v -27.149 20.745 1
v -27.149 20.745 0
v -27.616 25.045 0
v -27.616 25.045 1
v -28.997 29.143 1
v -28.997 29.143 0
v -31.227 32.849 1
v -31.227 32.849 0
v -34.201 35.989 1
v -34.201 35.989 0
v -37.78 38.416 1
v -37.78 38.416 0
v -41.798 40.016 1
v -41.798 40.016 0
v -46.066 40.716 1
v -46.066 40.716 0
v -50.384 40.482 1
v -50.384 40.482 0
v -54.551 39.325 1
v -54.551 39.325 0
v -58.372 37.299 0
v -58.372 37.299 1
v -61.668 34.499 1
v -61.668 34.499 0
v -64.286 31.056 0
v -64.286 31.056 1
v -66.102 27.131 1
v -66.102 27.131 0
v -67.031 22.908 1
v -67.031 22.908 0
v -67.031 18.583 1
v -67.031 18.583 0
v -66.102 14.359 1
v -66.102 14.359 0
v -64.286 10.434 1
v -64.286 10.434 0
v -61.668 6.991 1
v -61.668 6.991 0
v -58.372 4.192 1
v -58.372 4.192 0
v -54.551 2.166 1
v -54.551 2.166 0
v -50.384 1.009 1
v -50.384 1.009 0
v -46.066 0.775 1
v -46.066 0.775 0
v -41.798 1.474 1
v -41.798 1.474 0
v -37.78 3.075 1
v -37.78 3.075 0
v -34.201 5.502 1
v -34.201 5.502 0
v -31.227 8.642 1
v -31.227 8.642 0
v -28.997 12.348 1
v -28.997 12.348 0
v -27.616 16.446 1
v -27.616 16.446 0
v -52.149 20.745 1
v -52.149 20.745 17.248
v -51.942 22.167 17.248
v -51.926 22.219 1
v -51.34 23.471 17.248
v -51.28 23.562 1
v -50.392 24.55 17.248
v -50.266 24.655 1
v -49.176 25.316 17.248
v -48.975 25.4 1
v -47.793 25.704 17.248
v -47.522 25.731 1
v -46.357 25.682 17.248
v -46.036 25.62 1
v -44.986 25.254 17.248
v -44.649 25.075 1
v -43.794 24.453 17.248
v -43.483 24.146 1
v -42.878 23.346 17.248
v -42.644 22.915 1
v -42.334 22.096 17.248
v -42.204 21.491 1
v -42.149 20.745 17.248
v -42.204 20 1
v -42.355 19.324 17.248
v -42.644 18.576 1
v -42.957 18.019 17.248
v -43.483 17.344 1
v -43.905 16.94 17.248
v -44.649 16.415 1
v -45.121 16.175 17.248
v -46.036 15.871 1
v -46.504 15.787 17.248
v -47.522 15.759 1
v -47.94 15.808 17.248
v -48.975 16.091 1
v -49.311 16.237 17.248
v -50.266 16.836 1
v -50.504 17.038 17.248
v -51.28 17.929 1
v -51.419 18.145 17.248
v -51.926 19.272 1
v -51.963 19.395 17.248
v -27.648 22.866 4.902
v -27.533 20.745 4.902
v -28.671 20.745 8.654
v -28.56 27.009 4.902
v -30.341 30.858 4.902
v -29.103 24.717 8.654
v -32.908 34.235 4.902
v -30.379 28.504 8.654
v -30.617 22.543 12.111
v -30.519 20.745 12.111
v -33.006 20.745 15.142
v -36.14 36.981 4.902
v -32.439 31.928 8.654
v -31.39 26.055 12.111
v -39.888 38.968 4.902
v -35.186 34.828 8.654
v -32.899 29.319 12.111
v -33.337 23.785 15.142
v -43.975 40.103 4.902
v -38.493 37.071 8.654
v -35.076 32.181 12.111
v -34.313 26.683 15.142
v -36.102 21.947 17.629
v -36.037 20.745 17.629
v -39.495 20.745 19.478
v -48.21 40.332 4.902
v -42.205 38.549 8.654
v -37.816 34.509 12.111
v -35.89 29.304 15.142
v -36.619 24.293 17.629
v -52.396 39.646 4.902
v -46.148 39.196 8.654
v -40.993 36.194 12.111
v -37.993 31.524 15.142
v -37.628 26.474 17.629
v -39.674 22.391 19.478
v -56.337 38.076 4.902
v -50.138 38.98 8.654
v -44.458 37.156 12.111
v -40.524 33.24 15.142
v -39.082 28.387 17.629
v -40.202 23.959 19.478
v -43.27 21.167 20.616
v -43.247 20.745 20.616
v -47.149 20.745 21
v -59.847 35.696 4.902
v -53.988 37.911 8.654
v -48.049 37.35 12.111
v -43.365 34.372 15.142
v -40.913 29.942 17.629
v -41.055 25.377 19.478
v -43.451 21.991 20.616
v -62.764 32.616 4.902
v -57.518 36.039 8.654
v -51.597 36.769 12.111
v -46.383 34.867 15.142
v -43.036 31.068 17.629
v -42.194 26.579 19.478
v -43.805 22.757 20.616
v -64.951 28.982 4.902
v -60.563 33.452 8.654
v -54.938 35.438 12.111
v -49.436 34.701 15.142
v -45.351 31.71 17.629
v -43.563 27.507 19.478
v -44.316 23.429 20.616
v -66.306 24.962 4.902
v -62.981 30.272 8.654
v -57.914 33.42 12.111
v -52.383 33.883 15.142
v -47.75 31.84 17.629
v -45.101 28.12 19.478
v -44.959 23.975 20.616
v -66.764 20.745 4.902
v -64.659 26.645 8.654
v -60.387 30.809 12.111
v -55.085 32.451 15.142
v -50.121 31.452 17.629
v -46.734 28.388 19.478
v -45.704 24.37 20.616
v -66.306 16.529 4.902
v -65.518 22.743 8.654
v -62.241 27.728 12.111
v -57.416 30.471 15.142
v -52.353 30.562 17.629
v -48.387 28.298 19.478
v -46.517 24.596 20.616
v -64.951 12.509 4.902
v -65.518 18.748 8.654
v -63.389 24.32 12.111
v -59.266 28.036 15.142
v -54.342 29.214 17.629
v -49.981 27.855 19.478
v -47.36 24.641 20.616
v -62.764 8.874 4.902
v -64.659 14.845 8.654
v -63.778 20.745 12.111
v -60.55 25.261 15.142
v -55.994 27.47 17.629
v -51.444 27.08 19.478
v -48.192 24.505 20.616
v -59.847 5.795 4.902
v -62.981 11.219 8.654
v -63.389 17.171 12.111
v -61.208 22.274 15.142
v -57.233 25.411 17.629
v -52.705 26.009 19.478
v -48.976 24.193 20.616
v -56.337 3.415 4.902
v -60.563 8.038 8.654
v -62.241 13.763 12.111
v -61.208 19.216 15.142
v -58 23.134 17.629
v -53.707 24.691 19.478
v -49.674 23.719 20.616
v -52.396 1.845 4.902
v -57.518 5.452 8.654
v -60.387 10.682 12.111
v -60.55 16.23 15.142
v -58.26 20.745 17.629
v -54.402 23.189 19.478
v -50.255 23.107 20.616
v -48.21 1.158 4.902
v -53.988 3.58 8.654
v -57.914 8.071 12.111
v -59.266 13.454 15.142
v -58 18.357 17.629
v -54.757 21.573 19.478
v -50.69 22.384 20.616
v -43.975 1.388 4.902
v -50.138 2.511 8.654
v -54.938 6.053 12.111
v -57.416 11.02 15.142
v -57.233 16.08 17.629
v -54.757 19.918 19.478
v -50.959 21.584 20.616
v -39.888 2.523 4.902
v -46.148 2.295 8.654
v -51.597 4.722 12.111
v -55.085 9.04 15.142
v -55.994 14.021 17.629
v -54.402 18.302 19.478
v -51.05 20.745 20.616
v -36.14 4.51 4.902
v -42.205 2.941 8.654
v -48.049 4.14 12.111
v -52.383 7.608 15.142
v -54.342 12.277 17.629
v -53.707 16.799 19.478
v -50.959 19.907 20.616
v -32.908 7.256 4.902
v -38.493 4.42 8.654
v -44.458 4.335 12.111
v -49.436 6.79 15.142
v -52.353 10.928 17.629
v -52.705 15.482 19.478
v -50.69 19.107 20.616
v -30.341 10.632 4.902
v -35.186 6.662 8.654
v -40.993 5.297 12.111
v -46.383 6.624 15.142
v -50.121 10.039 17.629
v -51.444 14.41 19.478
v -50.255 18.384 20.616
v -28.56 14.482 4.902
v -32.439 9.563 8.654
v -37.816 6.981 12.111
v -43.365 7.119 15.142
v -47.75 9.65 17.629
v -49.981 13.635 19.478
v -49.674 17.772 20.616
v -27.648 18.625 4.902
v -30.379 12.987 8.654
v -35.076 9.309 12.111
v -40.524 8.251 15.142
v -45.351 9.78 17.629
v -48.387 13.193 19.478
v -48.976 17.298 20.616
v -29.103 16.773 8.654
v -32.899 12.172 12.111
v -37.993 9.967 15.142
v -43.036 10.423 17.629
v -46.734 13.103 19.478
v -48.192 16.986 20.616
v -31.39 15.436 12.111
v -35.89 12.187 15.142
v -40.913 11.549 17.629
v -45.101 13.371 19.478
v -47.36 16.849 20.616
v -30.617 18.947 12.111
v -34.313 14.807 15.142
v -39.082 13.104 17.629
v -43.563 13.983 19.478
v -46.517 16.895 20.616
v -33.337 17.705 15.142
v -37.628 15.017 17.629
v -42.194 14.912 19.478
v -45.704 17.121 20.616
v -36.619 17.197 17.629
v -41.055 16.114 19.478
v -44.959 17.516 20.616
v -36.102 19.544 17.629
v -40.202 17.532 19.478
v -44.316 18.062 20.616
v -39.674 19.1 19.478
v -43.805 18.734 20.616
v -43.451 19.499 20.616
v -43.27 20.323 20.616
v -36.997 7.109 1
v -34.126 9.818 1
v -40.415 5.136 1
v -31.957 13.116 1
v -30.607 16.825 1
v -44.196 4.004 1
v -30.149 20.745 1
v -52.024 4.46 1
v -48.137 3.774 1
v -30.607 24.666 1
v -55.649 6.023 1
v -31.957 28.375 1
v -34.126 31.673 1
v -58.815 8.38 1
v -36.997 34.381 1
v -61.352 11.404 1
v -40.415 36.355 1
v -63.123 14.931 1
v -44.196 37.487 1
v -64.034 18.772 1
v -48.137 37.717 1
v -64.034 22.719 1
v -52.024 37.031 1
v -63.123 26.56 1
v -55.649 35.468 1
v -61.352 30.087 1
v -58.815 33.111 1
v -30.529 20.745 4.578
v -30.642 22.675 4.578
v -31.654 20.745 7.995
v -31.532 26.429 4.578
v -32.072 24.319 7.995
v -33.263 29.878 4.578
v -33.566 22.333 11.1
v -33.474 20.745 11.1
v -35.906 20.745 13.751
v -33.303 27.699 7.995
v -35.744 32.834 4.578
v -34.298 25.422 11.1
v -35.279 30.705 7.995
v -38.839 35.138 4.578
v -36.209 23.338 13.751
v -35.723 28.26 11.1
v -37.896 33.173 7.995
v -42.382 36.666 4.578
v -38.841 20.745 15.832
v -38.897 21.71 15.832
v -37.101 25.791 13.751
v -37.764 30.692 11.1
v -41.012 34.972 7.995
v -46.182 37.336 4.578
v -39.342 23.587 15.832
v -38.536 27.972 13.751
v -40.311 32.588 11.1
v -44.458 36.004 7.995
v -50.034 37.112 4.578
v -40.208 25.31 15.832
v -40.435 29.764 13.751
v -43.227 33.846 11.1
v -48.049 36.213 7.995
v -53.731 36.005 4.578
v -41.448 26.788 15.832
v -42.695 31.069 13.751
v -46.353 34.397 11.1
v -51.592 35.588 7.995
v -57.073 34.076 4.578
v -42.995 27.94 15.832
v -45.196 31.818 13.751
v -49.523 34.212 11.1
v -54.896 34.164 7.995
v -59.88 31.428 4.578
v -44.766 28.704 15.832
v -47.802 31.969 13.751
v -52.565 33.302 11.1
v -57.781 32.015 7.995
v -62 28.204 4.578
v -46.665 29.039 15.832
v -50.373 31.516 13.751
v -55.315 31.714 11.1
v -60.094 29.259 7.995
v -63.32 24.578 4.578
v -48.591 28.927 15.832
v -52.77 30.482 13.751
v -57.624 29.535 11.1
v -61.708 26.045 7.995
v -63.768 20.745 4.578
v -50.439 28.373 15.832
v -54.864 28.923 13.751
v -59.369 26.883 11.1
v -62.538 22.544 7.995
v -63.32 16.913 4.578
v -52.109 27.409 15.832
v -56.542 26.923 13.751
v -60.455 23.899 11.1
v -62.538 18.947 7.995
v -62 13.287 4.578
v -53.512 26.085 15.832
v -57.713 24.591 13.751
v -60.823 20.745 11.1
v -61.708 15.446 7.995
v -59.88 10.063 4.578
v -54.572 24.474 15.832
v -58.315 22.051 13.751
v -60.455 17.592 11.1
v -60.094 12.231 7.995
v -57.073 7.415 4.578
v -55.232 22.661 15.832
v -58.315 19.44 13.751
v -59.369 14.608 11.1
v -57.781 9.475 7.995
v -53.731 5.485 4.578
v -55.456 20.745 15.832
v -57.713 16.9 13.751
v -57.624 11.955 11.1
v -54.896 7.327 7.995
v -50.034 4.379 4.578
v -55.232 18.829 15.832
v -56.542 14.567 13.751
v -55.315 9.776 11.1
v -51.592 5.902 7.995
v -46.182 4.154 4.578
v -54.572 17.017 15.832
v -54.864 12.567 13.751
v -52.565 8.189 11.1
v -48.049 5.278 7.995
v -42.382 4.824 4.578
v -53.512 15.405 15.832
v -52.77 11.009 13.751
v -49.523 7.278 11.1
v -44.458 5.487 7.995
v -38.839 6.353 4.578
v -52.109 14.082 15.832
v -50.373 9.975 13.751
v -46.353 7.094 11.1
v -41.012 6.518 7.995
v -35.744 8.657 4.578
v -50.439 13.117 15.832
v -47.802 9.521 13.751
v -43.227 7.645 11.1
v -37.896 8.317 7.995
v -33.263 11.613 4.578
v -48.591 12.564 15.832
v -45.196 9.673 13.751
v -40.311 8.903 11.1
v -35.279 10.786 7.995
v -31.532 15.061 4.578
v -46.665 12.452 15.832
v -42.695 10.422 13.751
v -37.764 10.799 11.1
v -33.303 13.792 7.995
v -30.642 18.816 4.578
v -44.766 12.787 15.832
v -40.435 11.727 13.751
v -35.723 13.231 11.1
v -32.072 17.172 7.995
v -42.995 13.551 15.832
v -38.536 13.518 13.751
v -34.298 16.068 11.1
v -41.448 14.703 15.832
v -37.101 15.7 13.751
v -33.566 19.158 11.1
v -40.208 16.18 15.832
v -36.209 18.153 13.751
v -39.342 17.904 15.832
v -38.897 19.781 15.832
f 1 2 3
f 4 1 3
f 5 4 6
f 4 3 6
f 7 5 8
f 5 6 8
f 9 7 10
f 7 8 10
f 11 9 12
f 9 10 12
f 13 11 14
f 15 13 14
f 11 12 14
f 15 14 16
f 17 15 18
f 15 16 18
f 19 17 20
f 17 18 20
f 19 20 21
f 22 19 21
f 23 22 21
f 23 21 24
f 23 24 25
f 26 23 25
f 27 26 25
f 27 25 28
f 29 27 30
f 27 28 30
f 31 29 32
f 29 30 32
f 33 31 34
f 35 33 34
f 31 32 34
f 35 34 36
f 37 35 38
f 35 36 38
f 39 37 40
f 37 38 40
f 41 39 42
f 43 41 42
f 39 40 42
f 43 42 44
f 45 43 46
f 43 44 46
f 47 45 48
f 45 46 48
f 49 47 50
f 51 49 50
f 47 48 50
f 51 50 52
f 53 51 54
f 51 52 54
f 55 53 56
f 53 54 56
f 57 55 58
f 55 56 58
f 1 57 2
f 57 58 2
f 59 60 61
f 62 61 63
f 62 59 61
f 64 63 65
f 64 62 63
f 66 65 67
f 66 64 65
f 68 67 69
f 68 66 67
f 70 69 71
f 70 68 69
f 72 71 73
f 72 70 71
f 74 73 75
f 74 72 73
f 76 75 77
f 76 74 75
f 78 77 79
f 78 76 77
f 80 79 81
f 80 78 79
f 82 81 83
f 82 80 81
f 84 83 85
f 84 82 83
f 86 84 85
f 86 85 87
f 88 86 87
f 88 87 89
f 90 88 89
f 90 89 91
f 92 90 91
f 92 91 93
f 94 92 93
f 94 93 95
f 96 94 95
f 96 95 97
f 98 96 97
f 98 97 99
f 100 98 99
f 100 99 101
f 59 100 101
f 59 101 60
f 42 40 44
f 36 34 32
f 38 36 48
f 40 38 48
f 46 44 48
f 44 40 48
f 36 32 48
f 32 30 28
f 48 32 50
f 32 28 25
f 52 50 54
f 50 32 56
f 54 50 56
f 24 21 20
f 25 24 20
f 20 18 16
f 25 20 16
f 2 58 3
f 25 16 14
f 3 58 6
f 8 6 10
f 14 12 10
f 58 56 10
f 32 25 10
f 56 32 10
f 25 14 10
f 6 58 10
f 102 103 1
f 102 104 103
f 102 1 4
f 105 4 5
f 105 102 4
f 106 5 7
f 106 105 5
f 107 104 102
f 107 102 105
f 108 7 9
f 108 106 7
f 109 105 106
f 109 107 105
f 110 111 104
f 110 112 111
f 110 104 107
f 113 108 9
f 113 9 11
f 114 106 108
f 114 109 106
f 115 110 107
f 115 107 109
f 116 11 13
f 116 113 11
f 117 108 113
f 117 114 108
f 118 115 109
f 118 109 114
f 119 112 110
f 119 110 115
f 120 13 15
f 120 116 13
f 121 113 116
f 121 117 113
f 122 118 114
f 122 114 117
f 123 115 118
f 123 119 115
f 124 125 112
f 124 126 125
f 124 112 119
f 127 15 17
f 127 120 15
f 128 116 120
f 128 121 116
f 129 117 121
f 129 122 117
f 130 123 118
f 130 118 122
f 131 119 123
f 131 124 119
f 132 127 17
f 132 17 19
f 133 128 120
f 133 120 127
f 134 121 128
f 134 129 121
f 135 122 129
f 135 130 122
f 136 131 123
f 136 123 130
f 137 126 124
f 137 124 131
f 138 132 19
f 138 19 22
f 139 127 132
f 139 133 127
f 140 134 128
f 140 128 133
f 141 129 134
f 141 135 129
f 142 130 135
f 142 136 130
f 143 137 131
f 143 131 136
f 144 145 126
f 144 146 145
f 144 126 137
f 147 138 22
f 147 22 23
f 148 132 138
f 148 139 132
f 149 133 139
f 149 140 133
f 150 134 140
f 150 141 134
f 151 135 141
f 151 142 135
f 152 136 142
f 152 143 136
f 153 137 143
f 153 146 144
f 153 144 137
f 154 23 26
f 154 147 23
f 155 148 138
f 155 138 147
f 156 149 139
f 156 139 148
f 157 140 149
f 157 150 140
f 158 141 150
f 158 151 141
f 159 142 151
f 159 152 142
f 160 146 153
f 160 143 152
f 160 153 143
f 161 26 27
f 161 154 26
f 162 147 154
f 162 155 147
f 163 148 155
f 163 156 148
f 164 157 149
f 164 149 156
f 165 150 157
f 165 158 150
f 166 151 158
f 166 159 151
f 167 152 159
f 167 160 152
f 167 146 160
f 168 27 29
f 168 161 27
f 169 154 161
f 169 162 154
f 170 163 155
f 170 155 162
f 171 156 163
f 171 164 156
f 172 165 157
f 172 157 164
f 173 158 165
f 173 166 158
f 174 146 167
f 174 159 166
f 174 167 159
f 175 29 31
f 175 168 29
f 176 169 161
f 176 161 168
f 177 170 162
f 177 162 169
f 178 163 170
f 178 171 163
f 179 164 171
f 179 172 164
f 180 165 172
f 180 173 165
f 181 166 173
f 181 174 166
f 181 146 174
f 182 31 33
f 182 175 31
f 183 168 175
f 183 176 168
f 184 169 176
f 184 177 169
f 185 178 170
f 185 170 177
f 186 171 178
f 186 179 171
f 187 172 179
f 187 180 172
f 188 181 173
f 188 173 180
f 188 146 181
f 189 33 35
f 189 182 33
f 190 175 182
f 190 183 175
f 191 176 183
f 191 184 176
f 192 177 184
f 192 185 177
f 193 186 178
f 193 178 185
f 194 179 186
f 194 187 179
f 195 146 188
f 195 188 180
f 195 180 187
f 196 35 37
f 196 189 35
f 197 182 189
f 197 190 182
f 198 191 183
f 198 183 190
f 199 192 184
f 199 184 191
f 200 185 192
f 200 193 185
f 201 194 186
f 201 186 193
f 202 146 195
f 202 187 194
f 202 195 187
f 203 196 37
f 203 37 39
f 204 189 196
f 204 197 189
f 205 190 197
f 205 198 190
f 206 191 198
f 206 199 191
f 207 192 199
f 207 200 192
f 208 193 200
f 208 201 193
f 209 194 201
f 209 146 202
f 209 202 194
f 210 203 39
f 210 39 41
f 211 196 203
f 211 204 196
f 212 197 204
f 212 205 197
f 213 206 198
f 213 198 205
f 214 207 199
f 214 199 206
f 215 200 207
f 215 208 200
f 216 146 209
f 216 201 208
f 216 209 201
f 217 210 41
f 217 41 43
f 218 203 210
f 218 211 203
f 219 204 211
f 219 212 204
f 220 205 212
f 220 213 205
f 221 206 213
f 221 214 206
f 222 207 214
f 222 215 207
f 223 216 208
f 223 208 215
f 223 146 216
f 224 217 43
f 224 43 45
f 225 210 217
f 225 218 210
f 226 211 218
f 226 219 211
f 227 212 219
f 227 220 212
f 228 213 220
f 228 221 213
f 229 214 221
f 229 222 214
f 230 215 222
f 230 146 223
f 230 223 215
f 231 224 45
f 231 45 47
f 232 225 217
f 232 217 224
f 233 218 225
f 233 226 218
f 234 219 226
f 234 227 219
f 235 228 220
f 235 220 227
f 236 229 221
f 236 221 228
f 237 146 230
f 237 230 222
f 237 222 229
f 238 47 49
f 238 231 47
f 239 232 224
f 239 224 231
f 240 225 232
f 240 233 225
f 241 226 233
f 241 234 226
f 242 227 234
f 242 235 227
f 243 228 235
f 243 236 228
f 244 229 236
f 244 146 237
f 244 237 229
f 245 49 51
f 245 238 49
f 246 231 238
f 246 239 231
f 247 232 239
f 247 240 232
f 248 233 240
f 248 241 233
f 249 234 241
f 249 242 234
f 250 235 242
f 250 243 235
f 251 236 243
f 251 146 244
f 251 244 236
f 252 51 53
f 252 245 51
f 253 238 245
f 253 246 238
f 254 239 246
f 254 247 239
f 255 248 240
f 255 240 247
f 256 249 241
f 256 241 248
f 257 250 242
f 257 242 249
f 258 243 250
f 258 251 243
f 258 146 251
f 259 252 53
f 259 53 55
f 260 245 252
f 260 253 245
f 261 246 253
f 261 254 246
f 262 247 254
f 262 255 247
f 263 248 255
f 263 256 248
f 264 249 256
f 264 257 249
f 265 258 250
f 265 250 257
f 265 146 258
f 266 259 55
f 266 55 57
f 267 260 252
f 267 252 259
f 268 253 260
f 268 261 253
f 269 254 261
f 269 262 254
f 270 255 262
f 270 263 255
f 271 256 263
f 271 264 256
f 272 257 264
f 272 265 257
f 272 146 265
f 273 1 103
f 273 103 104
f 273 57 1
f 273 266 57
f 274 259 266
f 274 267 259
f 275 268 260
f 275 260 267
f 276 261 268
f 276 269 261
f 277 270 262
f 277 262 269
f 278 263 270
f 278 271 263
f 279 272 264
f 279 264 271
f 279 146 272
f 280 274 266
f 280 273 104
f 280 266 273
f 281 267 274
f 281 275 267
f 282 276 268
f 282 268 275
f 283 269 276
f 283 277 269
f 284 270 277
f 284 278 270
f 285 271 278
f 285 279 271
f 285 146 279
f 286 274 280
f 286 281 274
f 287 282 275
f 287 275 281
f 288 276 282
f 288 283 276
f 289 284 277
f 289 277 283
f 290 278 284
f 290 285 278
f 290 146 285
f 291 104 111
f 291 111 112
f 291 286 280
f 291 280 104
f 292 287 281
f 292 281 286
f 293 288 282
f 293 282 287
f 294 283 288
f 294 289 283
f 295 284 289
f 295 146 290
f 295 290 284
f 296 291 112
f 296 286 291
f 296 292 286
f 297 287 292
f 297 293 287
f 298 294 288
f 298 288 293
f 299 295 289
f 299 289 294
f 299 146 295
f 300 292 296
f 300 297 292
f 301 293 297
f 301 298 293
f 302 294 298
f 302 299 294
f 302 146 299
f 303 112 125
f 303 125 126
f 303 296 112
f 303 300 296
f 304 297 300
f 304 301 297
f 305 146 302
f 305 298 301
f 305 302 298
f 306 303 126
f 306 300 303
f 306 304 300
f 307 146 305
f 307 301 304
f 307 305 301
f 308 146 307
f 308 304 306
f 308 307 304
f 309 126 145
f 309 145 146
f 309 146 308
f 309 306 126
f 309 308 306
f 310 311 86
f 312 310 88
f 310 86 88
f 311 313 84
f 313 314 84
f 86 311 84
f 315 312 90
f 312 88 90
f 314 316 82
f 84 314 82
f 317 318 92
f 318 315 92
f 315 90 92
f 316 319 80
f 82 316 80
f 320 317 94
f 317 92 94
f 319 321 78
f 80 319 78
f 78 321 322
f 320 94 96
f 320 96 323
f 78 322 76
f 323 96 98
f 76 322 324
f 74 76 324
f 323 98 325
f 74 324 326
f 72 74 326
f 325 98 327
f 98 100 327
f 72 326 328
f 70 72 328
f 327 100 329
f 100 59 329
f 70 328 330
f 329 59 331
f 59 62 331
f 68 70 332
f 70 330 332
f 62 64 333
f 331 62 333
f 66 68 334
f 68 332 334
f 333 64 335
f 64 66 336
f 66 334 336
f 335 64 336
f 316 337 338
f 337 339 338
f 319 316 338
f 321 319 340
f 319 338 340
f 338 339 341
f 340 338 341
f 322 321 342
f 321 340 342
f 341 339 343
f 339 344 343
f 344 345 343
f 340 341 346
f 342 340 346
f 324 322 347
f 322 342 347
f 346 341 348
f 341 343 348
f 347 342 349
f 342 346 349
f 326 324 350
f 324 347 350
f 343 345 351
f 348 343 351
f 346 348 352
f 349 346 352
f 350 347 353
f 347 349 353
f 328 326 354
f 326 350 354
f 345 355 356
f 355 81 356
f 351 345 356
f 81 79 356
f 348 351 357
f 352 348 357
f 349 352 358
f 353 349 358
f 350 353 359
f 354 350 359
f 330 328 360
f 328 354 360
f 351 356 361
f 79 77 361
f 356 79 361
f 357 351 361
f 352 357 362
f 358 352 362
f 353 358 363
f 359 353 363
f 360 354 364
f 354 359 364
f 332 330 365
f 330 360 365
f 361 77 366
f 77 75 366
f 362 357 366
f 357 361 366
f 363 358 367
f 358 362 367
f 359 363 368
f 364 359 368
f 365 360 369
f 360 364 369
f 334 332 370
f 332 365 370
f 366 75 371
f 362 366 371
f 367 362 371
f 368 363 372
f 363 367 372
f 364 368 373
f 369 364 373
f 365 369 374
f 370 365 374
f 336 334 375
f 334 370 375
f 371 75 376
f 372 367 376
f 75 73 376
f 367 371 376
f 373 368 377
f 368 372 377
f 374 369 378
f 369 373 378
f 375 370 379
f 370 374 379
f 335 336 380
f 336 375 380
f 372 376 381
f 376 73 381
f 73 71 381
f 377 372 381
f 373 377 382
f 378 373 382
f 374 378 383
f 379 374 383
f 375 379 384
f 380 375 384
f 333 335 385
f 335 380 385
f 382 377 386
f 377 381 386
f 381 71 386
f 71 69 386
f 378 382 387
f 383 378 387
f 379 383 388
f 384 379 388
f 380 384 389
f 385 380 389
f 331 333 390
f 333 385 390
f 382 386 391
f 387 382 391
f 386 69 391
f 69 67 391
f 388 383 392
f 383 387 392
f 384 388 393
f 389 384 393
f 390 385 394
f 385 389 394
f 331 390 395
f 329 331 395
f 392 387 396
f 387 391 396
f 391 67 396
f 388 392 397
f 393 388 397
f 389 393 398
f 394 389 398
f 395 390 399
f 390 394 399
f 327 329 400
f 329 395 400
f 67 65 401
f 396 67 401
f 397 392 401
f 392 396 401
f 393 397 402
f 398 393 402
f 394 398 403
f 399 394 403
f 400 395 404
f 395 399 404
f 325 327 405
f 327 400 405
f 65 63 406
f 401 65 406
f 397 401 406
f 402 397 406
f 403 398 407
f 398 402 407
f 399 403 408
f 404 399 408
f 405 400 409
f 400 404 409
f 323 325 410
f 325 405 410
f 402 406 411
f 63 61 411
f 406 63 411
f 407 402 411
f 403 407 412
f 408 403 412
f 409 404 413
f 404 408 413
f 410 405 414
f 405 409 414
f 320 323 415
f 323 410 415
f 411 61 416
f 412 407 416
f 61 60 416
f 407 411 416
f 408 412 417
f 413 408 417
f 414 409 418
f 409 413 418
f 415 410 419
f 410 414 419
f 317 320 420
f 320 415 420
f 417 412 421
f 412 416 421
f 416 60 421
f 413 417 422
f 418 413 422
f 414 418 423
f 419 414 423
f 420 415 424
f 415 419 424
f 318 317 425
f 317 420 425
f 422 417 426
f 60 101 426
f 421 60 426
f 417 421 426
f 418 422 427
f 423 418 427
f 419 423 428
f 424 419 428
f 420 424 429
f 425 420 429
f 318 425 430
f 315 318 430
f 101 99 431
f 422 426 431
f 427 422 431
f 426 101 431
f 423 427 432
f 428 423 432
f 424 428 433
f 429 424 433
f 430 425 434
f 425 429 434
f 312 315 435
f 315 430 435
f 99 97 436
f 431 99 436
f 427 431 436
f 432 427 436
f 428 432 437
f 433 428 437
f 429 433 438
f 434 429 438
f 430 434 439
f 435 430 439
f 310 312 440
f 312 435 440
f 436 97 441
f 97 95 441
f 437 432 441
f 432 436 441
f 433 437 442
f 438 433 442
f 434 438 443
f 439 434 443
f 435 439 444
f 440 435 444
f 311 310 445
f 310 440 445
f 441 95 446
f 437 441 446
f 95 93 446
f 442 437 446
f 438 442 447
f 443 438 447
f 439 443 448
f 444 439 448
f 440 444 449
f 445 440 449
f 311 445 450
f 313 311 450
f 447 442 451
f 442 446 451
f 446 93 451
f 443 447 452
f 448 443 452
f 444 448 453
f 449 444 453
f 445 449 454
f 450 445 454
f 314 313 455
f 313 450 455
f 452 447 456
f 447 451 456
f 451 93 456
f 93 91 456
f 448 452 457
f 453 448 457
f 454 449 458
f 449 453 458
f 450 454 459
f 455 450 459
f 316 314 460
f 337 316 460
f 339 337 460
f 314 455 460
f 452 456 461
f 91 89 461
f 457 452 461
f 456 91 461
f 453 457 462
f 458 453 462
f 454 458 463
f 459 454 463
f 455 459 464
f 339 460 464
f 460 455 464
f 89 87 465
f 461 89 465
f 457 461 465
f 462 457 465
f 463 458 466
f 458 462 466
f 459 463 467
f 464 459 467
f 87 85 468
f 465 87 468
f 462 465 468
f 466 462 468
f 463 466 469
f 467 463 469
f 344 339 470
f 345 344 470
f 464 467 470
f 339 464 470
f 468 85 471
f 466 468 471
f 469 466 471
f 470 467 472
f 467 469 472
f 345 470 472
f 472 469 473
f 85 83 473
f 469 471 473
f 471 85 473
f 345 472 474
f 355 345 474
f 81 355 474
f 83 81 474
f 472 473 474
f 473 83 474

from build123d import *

# Parameters (mm, degrees)
SKETCH1_R           = 20
BOSS_EXTRUDE1_DEPTH = 1
DOME1_FACE_RADIUS   = 20
DOME1_HEIGHT        = 20
SKETCH2_R           = 5
BOSS_EXTRUDE2_DEPTH = 20
SKETCH3_R           = 18.75
BOSS_EXTRUDE3_DEPTH = 1


# Read off the part's stored shape, not the designer's step: Shell1
with BuildPart() as part:
    # Sketch1 → Boss-Extrude1 (new body)
    with BuildSketch(Plane.XY):
        with Locations((-47.148513575, 20.745345973)):
            Circle(SKETCH1_R)
    extrude(amount=BOSS_EXTRUDE1_DEPTH)

    # Dome1: a dome of height H over a round flat face of radius A is a cap of a sphere of radius (A * A + H * H) / (2 * H)
    dome1_r = (DOME1_FACE_RADIUS * DOME1_FACE_RADIUS + DOME1_HEIGHT * DOME1_HEIGHT) / (2 * DOME1_HEIGHT)
    dome1_base = Plane((-47.148513575, 20.745345973, 1), z_dir=(0, 0, 1))
    with Locations(dome1_base.offset(DOME1_HEIGHT - dome1_r)):
        dome1_ball = Sphere(dome1_r, mode=Mode.PRIVATE)
    add(split(dome1_ball, bisect_by=dome1_base, keep=Keep.TOP, mode=Mode.PRIVATE))

    # Shell1 outline → Shell1 (revolve, cut)
    with BuildSketch(Plane(origin=(-47.148513575, 20.745345973, 0), x_dir=(1, 0, 0), z_dir=(0, -1, 0))):
        with BuildLine():
            Line((17, 0), (17, 0.999999983))
            ThreePointArc((17, 0.999999983), (12.020815286, 13.020815274), (0, 18))
            Line((0, 18), (0, 0))
            Line((0, 0), (17, 0))
        make_face()
    revolve(axis=Axis((-47.148513575, 20.745345973, 0), (0, 0, 1)), mode=Mode.SUBTRACT)

    # Sketch2 → Boss-Extrude2 (add)
    with BuildSketch(Plane(origin=(0, 0, 0), x_dir=(-1, 0, 0), z_dir=(0, 0, -1))):
        with Locations((47.148513575, 20.745345973)):
            Circle(SKETCH2_R)
    extrude(amount=-BOSS_EXTRUDE2_DEPTH)

    # Sketch3 → Boss-Extrude3 (add)
    with BuildSketch(Plane(origin=(0, 0, 0), x_dir=(-1, 0, 0), z_dir=(0, 0, -1))):
        with Locations((47.148513575, 20.745345973)):
            Circle(SKETCH3_R)
    extrude(amount=-BOSS_EXTRUDE3_DEPTH)


solid = part.part
